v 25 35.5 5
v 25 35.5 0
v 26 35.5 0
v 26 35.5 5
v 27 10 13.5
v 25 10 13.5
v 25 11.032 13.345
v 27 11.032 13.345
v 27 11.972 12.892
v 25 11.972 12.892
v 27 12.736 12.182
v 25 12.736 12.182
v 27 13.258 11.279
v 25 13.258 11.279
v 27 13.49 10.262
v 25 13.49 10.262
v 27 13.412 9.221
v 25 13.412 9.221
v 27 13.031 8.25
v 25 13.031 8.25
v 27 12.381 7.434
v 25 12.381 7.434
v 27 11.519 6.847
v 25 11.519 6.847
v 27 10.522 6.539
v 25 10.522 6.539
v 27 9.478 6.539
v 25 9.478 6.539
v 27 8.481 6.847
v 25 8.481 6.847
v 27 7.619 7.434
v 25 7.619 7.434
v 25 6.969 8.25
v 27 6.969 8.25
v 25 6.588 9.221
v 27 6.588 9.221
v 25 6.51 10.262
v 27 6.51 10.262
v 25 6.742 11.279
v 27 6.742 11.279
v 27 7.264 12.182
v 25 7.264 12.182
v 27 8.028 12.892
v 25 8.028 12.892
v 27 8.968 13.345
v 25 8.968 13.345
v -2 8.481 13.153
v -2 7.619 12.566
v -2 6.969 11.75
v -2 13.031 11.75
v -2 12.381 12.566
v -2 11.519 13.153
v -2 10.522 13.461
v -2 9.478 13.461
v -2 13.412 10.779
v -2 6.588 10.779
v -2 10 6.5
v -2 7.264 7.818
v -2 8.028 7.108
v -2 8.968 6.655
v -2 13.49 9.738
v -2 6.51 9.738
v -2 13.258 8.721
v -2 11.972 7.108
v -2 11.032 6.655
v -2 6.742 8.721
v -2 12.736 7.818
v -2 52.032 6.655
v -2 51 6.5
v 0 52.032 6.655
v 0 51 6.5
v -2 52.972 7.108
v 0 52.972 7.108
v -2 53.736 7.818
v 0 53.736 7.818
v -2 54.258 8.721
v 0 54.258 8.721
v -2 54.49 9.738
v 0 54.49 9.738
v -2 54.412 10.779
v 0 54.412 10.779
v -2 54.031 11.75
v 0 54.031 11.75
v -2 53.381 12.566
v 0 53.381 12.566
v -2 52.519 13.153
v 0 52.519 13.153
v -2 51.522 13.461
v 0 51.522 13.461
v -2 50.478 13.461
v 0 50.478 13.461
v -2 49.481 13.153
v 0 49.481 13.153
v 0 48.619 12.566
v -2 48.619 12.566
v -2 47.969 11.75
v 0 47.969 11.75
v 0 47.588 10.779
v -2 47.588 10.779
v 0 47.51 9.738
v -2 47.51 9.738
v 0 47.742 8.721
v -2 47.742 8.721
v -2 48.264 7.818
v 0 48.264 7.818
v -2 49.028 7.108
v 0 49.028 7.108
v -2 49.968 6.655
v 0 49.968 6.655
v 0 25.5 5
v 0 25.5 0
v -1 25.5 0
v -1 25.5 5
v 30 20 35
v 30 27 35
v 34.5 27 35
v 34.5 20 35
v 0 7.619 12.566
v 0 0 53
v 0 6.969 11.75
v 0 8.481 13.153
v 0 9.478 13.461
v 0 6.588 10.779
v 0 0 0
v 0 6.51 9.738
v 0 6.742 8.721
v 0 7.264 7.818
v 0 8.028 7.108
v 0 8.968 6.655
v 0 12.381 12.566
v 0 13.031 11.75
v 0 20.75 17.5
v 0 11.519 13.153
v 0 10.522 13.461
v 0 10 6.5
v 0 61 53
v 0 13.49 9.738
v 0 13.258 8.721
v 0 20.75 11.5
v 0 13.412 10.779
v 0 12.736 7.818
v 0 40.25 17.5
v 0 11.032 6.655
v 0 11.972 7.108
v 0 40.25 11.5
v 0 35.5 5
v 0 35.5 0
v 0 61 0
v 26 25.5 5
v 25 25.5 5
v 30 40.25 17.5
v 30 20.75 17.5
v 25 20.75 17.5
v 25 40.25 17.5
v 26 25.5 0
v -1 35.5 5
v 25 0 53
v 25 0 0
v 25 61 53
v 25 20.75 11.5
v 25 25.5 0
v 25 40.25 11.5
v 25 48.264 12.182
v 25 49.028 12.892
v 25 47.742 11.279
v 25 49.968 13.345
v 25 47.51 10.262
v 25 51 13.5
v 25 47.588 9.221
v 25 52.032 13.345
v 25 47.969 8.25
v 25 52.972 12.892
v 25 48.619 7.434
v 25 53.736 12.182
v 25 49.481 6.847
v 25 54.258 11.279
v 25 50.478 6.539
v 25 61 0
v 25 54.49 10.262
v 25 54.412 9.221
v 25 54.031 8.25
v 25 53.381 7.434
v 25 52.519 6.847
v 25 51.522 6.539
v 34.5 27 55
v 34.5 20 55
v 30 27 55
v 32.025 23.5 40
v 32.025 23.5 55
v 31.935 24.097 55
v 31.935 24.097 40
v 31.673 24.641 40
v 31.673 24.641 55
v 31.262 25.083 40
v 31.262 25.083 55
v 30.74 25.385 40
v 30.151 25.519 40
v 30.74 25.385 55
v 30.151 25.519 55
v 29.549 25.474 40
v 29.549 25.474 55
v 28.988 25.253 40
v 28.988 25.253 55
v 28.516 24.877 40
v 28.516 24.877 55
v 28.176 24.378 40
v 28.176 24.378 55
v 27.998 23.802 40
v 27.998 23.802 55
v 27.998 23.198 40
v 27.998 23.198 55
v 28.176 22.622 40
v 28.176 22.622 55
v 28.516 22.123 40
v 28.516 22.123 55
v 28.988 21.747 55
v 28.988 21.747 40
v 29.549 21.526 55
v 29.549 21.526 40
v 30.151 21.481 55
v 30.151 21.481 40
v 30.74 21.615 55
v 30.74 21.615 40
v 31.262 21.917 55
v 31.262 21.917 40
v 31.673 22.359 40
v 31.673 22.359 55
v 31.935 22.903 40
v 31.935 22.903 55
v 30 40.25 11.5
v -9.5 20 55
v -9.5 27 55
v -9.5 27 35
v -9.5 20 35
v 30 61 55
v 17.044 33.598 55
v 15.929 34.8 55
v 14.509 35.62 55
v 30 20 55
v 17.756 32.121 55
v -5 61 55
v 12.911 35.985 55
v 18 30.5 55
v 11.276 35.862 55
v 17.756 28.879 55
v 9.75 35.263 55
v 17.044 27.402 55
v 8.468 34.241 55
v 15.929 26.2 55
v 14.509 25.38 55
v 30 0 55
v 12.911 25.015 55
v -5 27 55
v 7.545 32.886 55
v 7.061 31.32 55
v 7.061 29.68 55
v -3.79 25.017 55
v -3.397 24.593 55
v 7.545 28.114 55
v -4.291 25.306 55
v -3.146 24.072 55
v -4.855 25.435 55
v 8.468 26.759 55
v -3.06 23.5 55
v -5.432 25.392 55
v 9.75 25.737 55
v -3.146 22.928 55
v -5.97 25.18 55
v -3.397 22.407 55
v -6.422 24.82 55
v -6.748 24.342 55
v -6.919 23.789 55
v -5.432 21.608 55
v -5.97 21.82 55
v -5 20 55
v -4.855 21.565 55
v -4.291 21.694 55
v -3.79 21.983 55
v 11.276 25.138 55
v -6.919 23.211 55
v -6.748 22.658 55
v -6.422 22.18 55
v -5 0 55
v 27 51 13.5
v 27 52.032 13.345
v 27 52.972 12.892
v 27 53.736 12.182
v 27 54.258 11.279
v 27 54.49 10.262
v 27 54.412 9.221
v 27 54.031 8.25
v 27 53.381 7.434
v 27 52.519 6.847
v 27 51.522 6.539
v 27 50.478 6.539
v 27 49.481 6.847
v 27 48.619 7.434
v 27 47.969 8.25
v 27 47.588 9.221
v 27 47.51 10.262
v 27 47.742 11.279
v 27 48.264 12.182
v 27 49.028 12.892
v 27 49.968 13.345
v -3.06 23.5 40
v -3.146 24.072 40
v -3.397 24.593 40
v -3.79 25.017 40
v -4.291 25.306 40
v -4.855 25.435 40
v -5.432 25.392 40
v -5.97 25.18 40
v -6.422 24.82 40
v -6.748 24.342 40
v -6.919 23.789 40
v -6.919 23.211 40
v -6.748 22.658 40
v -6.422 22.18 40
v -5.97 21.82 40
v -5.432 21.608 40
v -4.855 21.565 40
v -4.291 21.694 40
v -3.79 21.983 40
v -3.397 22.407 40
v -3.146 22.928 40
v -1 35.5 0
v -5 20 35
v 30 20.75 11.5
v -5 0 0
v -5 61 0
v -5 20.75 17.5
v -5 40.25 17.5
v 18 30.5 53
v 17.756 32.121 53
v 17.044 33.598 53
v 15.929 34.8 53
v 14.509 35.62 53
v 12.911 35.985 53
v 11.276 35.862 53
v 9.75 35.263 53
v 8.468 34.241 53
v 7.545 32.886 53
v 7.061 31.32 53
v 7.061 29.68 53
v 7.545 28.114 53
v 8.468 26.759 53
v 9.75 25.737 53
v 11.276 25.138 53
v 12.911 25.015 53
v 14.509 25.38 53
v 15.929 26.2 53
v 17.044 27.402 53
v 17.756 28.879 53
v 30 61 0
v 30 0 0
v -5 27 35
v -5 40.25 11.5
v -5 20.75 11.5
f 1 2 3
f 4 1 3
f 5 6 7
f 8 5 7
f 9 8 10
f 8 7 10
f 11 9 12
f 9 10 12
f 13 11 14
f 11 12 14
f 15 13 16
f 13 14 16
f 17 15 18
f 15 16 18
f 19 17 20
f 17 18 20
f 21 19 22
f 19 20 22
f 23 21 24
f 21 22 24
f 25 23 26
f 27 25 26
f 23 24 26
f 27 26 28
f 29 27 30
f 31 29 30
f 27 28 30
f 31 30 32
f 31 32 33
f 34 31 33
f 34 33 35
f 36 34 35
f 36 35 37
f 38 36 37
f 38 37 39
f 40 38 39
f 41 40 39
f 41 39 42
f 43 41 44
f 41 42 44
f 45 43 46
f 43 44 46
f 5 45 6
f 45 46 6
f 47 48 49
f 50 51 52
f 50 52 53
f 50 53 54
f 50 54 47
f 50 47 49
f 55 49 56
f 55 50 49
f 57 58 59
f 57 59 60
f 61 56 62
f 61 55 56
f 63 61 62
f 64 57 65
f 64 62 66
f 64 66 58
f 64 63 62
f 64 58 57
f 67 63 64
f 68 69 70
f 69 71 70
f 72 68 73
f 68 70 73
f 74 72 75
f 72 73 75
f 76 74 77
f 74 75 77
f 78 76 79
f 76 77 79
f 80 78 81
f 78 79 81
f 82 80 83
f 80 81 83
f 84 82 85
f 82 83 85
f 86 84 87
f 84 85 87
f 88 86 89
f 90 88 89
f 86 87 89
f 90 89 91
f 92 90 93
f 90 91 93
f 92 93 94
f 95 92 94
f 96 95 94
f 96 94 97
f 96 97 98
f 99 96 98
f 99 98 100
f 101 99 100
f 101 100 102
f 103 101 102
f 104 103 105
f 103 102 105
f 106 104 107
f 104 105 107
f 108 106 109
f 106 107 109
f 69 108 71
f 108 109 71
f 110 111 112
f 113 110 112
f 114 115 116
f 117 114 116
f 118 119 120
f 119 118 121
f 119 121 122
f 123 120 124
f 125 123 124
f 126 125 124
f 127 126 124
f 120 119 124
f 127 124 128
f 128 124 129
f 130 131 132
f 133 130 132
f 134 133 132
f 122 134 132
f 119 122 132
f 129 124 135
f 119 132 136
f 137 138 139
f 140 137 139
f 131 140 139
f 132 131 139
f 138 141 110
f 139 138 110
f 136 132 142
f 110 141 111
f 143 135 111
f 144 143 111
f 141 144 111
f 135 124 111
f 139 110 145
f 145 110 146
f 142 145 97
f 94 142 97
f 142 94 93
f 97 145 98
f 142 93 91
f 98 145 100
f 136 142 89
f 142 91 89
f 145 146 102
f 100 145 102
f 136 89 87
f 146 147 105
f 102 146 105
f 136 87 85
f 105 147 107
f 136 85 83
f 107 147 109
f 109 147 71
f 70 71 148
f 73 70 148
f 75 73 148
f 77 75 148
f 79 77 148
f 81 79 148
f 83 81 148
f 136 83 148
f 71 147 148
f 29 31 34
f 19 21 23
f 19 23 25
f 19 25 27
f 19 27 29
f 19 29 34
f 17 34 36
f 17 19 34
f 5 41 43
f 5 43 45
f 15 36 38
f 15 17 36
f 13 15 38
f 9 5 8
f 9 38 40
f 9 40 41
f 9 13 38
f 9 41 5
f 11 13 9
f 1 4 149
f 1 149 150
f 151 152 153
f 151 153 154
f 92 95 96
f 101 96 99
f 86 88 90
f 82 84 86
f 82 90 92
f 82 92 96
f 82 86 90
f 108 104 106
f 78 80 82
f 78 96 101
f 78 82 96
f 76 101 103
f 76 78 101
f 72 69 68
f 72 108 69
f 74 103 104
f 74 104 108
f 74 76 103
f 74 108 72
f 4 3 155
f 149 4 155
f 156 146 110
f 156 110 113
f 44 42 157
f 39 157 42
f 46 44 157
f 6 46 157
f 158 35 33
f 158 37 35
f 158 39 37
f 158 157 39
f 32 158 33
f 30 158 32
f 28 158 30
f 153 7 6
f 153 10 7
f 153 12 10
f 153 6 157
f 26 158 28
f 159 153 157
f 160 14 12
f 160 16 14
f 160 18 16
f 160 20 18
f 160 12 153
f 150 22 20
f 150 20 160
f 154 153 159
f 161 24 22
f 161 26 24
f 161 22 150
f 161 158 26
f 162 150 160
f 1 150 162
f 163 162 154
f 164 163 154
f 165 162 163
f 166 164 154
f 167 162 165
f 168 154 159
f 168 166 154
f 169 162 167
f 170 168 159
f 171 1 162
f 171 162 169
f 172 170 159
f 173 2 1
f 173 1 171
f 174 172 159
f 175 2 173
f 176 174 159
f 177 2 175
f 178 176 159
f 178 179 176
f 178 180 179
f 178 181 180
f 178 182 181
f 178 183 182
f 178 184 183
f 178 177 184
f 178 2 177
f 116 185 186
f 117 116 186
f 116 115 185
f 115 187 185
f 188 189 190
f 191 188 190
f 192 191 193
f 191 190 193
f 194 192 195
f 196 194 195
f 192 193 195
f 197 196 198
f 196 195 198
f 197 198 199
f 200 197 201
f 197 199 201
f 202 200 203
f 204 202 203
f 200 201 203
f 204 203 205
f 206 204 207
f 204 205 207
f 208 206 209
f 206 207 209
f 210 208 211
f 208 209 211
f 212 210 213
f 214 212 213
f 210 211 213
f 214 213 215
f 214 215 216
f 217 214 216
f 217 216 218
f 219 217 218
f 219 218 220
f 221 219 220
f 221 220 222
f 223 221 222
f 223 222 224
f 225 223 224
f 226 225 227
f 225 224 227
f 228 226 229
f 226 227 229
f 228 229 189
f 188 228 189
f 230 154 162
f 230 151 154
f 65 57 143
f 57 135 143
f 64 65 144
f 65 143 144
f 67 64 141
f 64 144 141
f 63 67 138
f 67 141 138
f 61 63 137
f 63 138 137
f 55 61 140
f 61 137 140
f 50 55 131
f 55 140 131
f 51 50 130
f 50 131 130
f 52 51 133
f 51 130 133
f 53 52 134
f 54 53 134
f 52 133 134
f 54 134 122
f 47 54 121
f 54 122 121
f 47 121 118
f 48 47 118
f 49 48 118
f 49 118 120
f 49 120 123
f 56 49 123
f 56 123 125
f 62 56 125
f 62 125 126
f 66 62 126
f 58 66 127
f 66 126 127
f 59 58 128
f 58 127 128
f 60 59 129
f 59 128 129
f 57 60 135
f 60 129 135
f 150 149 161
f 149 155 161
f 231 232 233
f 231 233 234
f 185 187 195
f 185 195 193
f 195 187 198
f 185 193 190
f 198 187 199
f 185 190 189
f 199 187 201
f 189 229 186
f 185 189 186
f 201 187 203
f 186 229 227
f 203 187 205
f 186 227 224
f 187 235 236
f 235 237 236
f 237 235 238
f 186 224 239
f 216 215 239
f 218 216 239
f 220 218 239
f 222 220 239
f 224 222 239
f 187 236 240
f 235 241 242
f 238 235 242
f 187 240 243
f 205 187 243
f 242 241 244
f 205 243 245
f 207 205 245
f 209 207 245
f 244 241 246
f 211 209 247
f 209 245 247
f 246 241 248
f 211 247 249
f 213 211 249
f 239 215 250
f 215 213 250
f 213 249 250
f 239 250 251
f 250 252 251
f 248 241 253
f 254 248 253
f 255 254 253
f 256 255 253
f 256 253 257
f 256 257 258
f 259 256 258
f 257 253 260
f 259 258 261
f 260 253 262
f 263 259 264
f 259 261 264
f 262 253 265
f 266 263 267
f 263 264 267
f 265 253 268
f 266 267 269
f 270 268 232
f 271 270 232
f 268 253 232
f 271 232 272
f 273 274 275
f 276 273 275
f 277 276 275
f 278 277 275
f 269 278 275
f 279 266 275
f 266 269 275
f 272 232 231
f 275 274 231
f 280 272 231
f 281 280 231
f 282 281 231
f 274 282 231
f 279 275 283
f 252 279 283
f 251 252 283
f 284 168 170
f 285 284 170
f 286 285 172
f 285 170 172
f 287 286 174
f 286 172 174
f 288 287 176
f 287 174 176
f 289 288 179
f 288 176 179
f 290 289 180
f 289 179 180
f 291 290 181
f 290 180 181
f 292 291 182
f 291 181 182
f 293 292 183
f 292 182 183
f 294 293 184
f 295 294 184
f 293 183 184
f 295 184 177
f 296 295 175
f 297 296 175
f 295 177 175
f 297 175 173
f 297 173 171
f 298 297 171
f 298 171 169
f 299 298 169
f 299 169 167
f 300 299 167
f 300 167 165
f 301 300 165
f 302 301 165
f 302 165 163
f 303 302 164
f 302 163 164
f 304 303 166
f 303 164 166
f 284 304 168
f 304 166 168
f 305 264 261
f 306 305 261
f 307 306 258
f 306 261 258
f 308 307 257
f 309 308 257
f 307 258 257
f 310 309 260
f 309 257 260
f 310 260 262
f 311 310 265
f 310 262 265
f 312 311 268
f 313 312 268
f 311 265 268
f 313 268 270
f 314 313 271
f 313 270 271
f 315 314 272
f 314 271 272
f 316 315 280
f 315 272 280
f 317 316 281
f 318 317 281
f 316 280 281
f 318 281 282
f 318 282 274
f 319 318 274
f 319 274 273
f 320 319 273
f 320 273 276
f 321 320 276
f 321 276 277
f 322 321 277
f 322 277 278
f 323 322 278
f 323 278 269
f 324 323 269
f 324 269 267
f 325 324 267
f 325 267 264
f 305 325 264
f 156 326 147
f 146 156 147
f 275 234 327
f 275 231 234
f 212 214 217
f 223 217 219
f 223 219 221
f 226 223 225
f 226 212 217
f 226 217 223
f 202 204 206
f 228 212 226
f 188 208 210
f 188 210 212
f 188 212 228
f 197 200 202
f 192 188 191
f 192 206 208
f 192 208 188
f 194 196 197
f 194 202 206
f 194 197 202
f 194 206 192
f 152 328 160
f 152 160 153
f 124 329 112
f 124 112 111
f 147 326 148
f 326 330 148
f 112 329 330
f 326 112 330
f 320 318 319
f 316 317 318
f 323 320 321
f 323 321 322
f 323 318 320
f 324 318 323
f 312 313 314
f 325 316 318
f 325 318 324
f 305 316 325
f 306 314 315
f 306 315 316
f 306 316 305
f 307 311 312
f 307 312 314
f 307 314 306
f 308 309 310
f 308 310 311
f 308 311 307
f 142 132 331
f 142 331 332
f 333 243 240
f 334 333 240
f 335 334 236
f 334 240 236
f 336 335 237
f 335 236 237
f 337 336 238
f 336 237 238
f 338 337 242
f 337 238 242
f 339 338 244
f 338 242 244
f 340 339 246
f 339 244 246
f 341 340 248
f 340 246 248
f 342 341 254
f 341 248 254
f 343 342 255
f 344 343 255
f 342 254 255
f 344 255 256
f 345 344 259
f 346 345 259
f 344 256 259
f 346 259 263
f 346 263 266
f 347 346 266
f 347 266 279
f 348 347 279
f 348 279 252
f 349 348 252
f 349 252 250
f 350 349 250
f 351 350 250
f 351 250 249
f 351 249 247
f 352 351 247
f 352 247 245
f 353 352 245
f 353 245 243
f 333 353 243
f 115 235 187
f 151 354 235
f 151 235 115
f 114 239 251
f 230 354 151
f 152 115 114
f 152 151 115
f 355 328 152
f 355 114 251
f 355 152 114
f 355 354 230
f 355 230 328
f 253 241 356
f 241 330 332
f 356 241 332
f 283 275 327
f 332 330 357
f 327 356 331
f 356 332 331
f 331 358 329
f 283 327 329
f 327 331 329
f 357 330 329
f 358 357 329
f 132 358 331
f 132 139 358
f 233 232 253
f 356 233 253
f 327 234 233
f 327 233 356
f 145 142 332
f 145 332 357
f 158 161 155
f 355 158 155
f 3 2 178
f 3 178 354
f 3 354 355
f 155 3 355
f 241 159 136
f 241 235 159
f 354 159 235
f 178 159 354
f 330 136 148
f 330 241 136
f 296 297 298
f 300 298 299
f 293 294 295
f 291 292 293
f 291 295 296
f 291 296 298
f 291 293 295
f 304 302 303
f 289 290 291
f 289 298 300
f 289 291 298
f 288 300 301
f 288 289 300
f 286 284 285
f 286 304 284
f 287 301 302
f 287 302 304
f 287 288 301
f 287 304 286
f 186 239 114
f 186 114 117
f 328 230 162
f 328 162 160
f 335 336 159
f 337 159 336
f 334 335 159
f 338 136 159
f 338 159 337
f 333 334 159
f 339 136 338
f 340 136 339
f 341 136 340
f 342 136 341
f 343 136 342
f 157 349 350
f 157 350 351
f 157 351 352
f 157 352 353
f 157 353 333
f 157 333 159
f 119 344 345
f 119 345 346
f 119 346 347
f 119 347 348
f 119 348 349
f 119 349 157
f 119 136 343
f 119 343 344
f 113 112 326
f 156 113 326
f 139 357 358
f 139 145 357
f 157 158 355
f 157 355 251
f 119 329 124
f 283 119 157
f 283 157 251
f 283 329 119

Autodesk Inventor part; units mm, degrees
ref_plane "YZ Plane" through (0, 0, 0) normal (1, 0, 0) x (0, 1, 0)
ref_plane "XZ Plane" through (0, 0, 0) normal (0, 1, 0) x (-1, 0, 0)
ref_plane "XY Plane" through (0, 0, 0) normal (0, 0, 1) x (1, 0, 0)
sketch "Skizze1" plane through (0, 0, 0) normal (0, 0, 1) x (1, 0, 0)
  line L0 (0, 0) -> (0, 61)
  line L1 (25, 0) -> (25, 61)
  line L2 (0, 61) -> (-5, 61)
  line L3 (25, 61) -> (30, 61)
  line L4 (-5, 61) -> (-5, 0)
  line L5 (-5, 0) -> (0, 0)
  line L6 (30, 61) -> (30, 0)
  line L7 (30, 0) -> (25, 0)
  dimension "d1" = 61
  dimension "d2" = 61
  dimension "d3" = 25
  dimension "d4" = 5
  dimension "d5" = 5
extrude "Extrusion1" add sketch "Skizze1" along normal blind 55
sketch "Skizze2" plane through (0, 0, 0) normal (1, 0, 0) x (0, 0, -1)
  line L0 (-55, 61) -> (-55, 0) projected
  line L1 (0, 0) -> (-55, 0) projected
  line L2 (-55, 61) -> (-53, 61)
  line L3 (-53, 61) -> (-53, 0)
  line L4 (-53, 0) -> (-55, 0)
  line L5 (-55, 0) -> (-55, 61)
  dimension "d8" = 2
extrude "Extrusion2" add sketch "Skizze2" along normal blind 25
sketch "Skizze3" plane through (0, 0, 55) normal (0, 0, 1) x (1, 0, 0)
  circle A0 centre (12.5, 30.5) radius 5.5
  line L0 (30, 61) -> (-5, 61) projected
  line L1 (30, 0) -> (30, 61) projected
  line L2 (30, 0) -> (-5, 0) projected
  line L3 (-5, 0) -> (-5, 61) projected
  line L4 (30, 61) -> (-5, 61) projected
  line L5 (-5, 61) -> (-5, 0) projected
  line L6 (-5, 0) -> (30, 0) projected
  line L7 (30, 0) -> (30, 61) projected
  line L8 (30, 61) -> (30, 0) projected
  line L9 (-5, 61) -> (30, 61) projected
  point P0 (0, 0)
  dimension "d11" = 30.5
  dimension "d12" = 17.5
  dimension "d13" = 11
extrude "Extrusion3" cut sketch "Skizze3" against normal blind 2.5 contours A0
sketch "Skizze4" plane through (0, 0, 55) normal (0, 0, 1) x (1, 0, 0)
  circle A0 centre (12.5, 30.5) radius 5.5 projected
  circle A1 centre (12.5, 30.5) radius 5.5 projected
  circle A2 centre (12.5, 30.5) radius 5.5 projected
  line L0 (-9.5, 27) -> (-9.5, 20)
  line L1 (34.5, 27) -> (34.5, 20)
  line L2 (30, 61) -> (30, 0) projected
  line L3 (-5, 61) -> (-5, 0) projected
  line L4 (-9.5, 27) -> (-2.5, 27)
  line L5 (27.5, 27) -> (34.5, 27)
  line L6 (-9.5, 20) -> (-2.5, 20)
  line L7 (27.5, 20) -> (34.5, 20)
  line L8 (-2.5, 20) -> (-2.5, 27)
  line L9 (27.5, 27) -> (27.5, 20)
  line L10 (30, 61) -> (30, 0) projected
  line L11 (30, 0) -> (-5, 0) projected
  line L12 (-5, 0) -> (-5, 61) projected
  line L13 (-5, 61) -> (30, 61) projected
  line L14 (30, 61) -> (30, 0) projected
  line L15 (30, 0) -> (-5, 0) projected
  line L16 (-5, 0) -> (-5, 61) projected
  line L17 (-5, 61) -> (30, 61) projected
  line L18 (30, 61) -> (30, 0) projected
  line L19 (30, 0) -> (-5, 0) projected
  line L20 (-5, 0) -> (-5, 61) projected
  line L21 (-5, 61) -> (30, 61) projected
  point P0 (0, 0)
  point P1 (27.5, 61)
  point P2 (27.5, 0)
  point P3 (-2.5, 0)
  point P4 (-2.5, 61)
  dimension "d29" = 7
  dimension "d30" = 7
  dimension "d31" = 7
  dimension "d32" = 7
extrude "Extrusion4" add sketch "Skizze4" against normal blind 20 contours L4 L3 L6 L0 | L4 L8 L6 L3 | L5 L1 L7 L2 | L2 L7 L9 L5
sketch "Skizze5" plane through (0, 0, 55) normal (0, 0, 1) x (1, 0, 0)
  circle A0 centre (-5, 23.5) radius 1.9403
  circle A1 centre (30, 23.5) radius 2.0247
  circle A2 centre (12.5, 30.5) radius 5.5 projected
  line L0 (-9.5, 20) -> (-9.5, 27) projected
  dimension "d25" = 35
  dimension "d27" = 7
  dimension "d28" = 7
  dimension "d33" = 17.5
extrude "Extrusion5" cut sketch "Skizze5" against normal blind 15 contours A0 | A1
sketch "Skizze6" plane through (30, 0, 0) normal (1, 0, 0) x (0, 0, -1)
  line L0 (-17.5, 40.25) -> (-11.5, 40.25)
  line L1 (-11.5, 40.25) -> (-11.5, 20.75)
  line L2 (-11.5, 20.75) -> (-17.5, 20.75)
  line L3 (-17.5, 20.75) -> (-17.5, 40.25)
  line L4 (0, 61) -> (0, 0) projected
  line L5 (0, 0) -> (-55, 0) projected
  line L6 (-55, 27) -> (-35, 27) projected
  line L7 (-35, 27) -> (-35, 20) projected
  line L8 (-35, 20) -> (-55, 20) projected
  line L9 (-55, 0) -> (-55, 20) projected
  line L10 (0, 0) -> (-55, 0) projected
  line L11 (0, 61) -> (0, 0) projected
  line L12 (0, 61) -> (-55, 61) projected
  line L13 (-55, 27) -> (-55, 61) projected
  point P0 (-17.5, 30.5)
  dimension "d36" = 6
  dimension "d37" = 19.5
  dimension "d38" = 11.5
  dimension "d40" = 30.5
extrude "Extrusion6" cut sketch "Skizze6" against normal blind 35 contours L0 L1 L2 L3
sketch "Skizze8" plane through (0, 0, 0) normal (0, 0, -1) x (-1, 0, 0)
  line L0 (0, 20.75) -> (0, 40.25) projected
  line L1 (1, 35.5) -> (0, 35.5)
  line L2 (0, 35.5) -> (0, 25.5)
  line L3 (0, 25.5) -> (1, 25.5)
  line L4 (1, 25.5) -> (1, 35.5)
  line L5 (0, 61) -> (5, 61) projected
  line L6 (-25, 0) -> (-25, 61) projected
  line L7 (-25, 35.5) -> (-26, 35.5)
  line L8 (-26, 35.5) -> (-26, 25.5)
  line L9 (-26, 25.5) -> (-25, 25.5)
  line L10 (-25, 25.5) -> (-25, 35.5)
  point P0 (0, 0)
  point P1 (1, 30.5)
  point P2 (13.2784, 51.1394)
  dimension "d43" = 1
  dimension "d44" = 10
  dimension "d45" = 30.5
  dimension "d46" = 1
extrude "Extrusion7" cut sketch "Skizze8" against normal blind 5
sketch "Skizze11" plane through (25, 0, 53) normal (-1, 0, 0) x (0, 0, 1)
  circle A0 centre (-43, 10) radius 3.5
  circle A1 centre (-43, 51) radius 3.5
  line L0 (-53, 61) -> (-53, 0) projected
  line L1 (-53, 0) -> (2, 0) projected
  line L2 (-53, 61) -> (2, 61) projected
  dimension "d63" = 7
  dimension "d64" = 7
  dimension "d65" = 10
  dimension "d66" = 10
  dimension "d67" = 10
  dimension "d68" = 10
sketch "Skizze12" plane through (0, 0, 53) normal (1, 0, 0) x (0, 0, -1)
  circle A0 centre (43, 10) radius 3.5
  circle A1 centre (43, 51) radius 3.5
  line L0 (53, 61) -> (53, 0) projected
  line L1 (53, 0) -> (-2, 0) projected
  line L2 (53, 61) -> (-2, 61) projected
  dimension "d69" = 7
  dimension "d70" = 7
  dimension "d71" = 10
  dimension "d72" = 10
  dimension "d73" = 10
  dimension "d74" = 10
extrude "Extrusion8" cut sketch "Skizze11" against normal blind 2
extrude "Extrusion9" cut sketch "Skizze12" against normal blind 2
properties part number "motor_mount"
